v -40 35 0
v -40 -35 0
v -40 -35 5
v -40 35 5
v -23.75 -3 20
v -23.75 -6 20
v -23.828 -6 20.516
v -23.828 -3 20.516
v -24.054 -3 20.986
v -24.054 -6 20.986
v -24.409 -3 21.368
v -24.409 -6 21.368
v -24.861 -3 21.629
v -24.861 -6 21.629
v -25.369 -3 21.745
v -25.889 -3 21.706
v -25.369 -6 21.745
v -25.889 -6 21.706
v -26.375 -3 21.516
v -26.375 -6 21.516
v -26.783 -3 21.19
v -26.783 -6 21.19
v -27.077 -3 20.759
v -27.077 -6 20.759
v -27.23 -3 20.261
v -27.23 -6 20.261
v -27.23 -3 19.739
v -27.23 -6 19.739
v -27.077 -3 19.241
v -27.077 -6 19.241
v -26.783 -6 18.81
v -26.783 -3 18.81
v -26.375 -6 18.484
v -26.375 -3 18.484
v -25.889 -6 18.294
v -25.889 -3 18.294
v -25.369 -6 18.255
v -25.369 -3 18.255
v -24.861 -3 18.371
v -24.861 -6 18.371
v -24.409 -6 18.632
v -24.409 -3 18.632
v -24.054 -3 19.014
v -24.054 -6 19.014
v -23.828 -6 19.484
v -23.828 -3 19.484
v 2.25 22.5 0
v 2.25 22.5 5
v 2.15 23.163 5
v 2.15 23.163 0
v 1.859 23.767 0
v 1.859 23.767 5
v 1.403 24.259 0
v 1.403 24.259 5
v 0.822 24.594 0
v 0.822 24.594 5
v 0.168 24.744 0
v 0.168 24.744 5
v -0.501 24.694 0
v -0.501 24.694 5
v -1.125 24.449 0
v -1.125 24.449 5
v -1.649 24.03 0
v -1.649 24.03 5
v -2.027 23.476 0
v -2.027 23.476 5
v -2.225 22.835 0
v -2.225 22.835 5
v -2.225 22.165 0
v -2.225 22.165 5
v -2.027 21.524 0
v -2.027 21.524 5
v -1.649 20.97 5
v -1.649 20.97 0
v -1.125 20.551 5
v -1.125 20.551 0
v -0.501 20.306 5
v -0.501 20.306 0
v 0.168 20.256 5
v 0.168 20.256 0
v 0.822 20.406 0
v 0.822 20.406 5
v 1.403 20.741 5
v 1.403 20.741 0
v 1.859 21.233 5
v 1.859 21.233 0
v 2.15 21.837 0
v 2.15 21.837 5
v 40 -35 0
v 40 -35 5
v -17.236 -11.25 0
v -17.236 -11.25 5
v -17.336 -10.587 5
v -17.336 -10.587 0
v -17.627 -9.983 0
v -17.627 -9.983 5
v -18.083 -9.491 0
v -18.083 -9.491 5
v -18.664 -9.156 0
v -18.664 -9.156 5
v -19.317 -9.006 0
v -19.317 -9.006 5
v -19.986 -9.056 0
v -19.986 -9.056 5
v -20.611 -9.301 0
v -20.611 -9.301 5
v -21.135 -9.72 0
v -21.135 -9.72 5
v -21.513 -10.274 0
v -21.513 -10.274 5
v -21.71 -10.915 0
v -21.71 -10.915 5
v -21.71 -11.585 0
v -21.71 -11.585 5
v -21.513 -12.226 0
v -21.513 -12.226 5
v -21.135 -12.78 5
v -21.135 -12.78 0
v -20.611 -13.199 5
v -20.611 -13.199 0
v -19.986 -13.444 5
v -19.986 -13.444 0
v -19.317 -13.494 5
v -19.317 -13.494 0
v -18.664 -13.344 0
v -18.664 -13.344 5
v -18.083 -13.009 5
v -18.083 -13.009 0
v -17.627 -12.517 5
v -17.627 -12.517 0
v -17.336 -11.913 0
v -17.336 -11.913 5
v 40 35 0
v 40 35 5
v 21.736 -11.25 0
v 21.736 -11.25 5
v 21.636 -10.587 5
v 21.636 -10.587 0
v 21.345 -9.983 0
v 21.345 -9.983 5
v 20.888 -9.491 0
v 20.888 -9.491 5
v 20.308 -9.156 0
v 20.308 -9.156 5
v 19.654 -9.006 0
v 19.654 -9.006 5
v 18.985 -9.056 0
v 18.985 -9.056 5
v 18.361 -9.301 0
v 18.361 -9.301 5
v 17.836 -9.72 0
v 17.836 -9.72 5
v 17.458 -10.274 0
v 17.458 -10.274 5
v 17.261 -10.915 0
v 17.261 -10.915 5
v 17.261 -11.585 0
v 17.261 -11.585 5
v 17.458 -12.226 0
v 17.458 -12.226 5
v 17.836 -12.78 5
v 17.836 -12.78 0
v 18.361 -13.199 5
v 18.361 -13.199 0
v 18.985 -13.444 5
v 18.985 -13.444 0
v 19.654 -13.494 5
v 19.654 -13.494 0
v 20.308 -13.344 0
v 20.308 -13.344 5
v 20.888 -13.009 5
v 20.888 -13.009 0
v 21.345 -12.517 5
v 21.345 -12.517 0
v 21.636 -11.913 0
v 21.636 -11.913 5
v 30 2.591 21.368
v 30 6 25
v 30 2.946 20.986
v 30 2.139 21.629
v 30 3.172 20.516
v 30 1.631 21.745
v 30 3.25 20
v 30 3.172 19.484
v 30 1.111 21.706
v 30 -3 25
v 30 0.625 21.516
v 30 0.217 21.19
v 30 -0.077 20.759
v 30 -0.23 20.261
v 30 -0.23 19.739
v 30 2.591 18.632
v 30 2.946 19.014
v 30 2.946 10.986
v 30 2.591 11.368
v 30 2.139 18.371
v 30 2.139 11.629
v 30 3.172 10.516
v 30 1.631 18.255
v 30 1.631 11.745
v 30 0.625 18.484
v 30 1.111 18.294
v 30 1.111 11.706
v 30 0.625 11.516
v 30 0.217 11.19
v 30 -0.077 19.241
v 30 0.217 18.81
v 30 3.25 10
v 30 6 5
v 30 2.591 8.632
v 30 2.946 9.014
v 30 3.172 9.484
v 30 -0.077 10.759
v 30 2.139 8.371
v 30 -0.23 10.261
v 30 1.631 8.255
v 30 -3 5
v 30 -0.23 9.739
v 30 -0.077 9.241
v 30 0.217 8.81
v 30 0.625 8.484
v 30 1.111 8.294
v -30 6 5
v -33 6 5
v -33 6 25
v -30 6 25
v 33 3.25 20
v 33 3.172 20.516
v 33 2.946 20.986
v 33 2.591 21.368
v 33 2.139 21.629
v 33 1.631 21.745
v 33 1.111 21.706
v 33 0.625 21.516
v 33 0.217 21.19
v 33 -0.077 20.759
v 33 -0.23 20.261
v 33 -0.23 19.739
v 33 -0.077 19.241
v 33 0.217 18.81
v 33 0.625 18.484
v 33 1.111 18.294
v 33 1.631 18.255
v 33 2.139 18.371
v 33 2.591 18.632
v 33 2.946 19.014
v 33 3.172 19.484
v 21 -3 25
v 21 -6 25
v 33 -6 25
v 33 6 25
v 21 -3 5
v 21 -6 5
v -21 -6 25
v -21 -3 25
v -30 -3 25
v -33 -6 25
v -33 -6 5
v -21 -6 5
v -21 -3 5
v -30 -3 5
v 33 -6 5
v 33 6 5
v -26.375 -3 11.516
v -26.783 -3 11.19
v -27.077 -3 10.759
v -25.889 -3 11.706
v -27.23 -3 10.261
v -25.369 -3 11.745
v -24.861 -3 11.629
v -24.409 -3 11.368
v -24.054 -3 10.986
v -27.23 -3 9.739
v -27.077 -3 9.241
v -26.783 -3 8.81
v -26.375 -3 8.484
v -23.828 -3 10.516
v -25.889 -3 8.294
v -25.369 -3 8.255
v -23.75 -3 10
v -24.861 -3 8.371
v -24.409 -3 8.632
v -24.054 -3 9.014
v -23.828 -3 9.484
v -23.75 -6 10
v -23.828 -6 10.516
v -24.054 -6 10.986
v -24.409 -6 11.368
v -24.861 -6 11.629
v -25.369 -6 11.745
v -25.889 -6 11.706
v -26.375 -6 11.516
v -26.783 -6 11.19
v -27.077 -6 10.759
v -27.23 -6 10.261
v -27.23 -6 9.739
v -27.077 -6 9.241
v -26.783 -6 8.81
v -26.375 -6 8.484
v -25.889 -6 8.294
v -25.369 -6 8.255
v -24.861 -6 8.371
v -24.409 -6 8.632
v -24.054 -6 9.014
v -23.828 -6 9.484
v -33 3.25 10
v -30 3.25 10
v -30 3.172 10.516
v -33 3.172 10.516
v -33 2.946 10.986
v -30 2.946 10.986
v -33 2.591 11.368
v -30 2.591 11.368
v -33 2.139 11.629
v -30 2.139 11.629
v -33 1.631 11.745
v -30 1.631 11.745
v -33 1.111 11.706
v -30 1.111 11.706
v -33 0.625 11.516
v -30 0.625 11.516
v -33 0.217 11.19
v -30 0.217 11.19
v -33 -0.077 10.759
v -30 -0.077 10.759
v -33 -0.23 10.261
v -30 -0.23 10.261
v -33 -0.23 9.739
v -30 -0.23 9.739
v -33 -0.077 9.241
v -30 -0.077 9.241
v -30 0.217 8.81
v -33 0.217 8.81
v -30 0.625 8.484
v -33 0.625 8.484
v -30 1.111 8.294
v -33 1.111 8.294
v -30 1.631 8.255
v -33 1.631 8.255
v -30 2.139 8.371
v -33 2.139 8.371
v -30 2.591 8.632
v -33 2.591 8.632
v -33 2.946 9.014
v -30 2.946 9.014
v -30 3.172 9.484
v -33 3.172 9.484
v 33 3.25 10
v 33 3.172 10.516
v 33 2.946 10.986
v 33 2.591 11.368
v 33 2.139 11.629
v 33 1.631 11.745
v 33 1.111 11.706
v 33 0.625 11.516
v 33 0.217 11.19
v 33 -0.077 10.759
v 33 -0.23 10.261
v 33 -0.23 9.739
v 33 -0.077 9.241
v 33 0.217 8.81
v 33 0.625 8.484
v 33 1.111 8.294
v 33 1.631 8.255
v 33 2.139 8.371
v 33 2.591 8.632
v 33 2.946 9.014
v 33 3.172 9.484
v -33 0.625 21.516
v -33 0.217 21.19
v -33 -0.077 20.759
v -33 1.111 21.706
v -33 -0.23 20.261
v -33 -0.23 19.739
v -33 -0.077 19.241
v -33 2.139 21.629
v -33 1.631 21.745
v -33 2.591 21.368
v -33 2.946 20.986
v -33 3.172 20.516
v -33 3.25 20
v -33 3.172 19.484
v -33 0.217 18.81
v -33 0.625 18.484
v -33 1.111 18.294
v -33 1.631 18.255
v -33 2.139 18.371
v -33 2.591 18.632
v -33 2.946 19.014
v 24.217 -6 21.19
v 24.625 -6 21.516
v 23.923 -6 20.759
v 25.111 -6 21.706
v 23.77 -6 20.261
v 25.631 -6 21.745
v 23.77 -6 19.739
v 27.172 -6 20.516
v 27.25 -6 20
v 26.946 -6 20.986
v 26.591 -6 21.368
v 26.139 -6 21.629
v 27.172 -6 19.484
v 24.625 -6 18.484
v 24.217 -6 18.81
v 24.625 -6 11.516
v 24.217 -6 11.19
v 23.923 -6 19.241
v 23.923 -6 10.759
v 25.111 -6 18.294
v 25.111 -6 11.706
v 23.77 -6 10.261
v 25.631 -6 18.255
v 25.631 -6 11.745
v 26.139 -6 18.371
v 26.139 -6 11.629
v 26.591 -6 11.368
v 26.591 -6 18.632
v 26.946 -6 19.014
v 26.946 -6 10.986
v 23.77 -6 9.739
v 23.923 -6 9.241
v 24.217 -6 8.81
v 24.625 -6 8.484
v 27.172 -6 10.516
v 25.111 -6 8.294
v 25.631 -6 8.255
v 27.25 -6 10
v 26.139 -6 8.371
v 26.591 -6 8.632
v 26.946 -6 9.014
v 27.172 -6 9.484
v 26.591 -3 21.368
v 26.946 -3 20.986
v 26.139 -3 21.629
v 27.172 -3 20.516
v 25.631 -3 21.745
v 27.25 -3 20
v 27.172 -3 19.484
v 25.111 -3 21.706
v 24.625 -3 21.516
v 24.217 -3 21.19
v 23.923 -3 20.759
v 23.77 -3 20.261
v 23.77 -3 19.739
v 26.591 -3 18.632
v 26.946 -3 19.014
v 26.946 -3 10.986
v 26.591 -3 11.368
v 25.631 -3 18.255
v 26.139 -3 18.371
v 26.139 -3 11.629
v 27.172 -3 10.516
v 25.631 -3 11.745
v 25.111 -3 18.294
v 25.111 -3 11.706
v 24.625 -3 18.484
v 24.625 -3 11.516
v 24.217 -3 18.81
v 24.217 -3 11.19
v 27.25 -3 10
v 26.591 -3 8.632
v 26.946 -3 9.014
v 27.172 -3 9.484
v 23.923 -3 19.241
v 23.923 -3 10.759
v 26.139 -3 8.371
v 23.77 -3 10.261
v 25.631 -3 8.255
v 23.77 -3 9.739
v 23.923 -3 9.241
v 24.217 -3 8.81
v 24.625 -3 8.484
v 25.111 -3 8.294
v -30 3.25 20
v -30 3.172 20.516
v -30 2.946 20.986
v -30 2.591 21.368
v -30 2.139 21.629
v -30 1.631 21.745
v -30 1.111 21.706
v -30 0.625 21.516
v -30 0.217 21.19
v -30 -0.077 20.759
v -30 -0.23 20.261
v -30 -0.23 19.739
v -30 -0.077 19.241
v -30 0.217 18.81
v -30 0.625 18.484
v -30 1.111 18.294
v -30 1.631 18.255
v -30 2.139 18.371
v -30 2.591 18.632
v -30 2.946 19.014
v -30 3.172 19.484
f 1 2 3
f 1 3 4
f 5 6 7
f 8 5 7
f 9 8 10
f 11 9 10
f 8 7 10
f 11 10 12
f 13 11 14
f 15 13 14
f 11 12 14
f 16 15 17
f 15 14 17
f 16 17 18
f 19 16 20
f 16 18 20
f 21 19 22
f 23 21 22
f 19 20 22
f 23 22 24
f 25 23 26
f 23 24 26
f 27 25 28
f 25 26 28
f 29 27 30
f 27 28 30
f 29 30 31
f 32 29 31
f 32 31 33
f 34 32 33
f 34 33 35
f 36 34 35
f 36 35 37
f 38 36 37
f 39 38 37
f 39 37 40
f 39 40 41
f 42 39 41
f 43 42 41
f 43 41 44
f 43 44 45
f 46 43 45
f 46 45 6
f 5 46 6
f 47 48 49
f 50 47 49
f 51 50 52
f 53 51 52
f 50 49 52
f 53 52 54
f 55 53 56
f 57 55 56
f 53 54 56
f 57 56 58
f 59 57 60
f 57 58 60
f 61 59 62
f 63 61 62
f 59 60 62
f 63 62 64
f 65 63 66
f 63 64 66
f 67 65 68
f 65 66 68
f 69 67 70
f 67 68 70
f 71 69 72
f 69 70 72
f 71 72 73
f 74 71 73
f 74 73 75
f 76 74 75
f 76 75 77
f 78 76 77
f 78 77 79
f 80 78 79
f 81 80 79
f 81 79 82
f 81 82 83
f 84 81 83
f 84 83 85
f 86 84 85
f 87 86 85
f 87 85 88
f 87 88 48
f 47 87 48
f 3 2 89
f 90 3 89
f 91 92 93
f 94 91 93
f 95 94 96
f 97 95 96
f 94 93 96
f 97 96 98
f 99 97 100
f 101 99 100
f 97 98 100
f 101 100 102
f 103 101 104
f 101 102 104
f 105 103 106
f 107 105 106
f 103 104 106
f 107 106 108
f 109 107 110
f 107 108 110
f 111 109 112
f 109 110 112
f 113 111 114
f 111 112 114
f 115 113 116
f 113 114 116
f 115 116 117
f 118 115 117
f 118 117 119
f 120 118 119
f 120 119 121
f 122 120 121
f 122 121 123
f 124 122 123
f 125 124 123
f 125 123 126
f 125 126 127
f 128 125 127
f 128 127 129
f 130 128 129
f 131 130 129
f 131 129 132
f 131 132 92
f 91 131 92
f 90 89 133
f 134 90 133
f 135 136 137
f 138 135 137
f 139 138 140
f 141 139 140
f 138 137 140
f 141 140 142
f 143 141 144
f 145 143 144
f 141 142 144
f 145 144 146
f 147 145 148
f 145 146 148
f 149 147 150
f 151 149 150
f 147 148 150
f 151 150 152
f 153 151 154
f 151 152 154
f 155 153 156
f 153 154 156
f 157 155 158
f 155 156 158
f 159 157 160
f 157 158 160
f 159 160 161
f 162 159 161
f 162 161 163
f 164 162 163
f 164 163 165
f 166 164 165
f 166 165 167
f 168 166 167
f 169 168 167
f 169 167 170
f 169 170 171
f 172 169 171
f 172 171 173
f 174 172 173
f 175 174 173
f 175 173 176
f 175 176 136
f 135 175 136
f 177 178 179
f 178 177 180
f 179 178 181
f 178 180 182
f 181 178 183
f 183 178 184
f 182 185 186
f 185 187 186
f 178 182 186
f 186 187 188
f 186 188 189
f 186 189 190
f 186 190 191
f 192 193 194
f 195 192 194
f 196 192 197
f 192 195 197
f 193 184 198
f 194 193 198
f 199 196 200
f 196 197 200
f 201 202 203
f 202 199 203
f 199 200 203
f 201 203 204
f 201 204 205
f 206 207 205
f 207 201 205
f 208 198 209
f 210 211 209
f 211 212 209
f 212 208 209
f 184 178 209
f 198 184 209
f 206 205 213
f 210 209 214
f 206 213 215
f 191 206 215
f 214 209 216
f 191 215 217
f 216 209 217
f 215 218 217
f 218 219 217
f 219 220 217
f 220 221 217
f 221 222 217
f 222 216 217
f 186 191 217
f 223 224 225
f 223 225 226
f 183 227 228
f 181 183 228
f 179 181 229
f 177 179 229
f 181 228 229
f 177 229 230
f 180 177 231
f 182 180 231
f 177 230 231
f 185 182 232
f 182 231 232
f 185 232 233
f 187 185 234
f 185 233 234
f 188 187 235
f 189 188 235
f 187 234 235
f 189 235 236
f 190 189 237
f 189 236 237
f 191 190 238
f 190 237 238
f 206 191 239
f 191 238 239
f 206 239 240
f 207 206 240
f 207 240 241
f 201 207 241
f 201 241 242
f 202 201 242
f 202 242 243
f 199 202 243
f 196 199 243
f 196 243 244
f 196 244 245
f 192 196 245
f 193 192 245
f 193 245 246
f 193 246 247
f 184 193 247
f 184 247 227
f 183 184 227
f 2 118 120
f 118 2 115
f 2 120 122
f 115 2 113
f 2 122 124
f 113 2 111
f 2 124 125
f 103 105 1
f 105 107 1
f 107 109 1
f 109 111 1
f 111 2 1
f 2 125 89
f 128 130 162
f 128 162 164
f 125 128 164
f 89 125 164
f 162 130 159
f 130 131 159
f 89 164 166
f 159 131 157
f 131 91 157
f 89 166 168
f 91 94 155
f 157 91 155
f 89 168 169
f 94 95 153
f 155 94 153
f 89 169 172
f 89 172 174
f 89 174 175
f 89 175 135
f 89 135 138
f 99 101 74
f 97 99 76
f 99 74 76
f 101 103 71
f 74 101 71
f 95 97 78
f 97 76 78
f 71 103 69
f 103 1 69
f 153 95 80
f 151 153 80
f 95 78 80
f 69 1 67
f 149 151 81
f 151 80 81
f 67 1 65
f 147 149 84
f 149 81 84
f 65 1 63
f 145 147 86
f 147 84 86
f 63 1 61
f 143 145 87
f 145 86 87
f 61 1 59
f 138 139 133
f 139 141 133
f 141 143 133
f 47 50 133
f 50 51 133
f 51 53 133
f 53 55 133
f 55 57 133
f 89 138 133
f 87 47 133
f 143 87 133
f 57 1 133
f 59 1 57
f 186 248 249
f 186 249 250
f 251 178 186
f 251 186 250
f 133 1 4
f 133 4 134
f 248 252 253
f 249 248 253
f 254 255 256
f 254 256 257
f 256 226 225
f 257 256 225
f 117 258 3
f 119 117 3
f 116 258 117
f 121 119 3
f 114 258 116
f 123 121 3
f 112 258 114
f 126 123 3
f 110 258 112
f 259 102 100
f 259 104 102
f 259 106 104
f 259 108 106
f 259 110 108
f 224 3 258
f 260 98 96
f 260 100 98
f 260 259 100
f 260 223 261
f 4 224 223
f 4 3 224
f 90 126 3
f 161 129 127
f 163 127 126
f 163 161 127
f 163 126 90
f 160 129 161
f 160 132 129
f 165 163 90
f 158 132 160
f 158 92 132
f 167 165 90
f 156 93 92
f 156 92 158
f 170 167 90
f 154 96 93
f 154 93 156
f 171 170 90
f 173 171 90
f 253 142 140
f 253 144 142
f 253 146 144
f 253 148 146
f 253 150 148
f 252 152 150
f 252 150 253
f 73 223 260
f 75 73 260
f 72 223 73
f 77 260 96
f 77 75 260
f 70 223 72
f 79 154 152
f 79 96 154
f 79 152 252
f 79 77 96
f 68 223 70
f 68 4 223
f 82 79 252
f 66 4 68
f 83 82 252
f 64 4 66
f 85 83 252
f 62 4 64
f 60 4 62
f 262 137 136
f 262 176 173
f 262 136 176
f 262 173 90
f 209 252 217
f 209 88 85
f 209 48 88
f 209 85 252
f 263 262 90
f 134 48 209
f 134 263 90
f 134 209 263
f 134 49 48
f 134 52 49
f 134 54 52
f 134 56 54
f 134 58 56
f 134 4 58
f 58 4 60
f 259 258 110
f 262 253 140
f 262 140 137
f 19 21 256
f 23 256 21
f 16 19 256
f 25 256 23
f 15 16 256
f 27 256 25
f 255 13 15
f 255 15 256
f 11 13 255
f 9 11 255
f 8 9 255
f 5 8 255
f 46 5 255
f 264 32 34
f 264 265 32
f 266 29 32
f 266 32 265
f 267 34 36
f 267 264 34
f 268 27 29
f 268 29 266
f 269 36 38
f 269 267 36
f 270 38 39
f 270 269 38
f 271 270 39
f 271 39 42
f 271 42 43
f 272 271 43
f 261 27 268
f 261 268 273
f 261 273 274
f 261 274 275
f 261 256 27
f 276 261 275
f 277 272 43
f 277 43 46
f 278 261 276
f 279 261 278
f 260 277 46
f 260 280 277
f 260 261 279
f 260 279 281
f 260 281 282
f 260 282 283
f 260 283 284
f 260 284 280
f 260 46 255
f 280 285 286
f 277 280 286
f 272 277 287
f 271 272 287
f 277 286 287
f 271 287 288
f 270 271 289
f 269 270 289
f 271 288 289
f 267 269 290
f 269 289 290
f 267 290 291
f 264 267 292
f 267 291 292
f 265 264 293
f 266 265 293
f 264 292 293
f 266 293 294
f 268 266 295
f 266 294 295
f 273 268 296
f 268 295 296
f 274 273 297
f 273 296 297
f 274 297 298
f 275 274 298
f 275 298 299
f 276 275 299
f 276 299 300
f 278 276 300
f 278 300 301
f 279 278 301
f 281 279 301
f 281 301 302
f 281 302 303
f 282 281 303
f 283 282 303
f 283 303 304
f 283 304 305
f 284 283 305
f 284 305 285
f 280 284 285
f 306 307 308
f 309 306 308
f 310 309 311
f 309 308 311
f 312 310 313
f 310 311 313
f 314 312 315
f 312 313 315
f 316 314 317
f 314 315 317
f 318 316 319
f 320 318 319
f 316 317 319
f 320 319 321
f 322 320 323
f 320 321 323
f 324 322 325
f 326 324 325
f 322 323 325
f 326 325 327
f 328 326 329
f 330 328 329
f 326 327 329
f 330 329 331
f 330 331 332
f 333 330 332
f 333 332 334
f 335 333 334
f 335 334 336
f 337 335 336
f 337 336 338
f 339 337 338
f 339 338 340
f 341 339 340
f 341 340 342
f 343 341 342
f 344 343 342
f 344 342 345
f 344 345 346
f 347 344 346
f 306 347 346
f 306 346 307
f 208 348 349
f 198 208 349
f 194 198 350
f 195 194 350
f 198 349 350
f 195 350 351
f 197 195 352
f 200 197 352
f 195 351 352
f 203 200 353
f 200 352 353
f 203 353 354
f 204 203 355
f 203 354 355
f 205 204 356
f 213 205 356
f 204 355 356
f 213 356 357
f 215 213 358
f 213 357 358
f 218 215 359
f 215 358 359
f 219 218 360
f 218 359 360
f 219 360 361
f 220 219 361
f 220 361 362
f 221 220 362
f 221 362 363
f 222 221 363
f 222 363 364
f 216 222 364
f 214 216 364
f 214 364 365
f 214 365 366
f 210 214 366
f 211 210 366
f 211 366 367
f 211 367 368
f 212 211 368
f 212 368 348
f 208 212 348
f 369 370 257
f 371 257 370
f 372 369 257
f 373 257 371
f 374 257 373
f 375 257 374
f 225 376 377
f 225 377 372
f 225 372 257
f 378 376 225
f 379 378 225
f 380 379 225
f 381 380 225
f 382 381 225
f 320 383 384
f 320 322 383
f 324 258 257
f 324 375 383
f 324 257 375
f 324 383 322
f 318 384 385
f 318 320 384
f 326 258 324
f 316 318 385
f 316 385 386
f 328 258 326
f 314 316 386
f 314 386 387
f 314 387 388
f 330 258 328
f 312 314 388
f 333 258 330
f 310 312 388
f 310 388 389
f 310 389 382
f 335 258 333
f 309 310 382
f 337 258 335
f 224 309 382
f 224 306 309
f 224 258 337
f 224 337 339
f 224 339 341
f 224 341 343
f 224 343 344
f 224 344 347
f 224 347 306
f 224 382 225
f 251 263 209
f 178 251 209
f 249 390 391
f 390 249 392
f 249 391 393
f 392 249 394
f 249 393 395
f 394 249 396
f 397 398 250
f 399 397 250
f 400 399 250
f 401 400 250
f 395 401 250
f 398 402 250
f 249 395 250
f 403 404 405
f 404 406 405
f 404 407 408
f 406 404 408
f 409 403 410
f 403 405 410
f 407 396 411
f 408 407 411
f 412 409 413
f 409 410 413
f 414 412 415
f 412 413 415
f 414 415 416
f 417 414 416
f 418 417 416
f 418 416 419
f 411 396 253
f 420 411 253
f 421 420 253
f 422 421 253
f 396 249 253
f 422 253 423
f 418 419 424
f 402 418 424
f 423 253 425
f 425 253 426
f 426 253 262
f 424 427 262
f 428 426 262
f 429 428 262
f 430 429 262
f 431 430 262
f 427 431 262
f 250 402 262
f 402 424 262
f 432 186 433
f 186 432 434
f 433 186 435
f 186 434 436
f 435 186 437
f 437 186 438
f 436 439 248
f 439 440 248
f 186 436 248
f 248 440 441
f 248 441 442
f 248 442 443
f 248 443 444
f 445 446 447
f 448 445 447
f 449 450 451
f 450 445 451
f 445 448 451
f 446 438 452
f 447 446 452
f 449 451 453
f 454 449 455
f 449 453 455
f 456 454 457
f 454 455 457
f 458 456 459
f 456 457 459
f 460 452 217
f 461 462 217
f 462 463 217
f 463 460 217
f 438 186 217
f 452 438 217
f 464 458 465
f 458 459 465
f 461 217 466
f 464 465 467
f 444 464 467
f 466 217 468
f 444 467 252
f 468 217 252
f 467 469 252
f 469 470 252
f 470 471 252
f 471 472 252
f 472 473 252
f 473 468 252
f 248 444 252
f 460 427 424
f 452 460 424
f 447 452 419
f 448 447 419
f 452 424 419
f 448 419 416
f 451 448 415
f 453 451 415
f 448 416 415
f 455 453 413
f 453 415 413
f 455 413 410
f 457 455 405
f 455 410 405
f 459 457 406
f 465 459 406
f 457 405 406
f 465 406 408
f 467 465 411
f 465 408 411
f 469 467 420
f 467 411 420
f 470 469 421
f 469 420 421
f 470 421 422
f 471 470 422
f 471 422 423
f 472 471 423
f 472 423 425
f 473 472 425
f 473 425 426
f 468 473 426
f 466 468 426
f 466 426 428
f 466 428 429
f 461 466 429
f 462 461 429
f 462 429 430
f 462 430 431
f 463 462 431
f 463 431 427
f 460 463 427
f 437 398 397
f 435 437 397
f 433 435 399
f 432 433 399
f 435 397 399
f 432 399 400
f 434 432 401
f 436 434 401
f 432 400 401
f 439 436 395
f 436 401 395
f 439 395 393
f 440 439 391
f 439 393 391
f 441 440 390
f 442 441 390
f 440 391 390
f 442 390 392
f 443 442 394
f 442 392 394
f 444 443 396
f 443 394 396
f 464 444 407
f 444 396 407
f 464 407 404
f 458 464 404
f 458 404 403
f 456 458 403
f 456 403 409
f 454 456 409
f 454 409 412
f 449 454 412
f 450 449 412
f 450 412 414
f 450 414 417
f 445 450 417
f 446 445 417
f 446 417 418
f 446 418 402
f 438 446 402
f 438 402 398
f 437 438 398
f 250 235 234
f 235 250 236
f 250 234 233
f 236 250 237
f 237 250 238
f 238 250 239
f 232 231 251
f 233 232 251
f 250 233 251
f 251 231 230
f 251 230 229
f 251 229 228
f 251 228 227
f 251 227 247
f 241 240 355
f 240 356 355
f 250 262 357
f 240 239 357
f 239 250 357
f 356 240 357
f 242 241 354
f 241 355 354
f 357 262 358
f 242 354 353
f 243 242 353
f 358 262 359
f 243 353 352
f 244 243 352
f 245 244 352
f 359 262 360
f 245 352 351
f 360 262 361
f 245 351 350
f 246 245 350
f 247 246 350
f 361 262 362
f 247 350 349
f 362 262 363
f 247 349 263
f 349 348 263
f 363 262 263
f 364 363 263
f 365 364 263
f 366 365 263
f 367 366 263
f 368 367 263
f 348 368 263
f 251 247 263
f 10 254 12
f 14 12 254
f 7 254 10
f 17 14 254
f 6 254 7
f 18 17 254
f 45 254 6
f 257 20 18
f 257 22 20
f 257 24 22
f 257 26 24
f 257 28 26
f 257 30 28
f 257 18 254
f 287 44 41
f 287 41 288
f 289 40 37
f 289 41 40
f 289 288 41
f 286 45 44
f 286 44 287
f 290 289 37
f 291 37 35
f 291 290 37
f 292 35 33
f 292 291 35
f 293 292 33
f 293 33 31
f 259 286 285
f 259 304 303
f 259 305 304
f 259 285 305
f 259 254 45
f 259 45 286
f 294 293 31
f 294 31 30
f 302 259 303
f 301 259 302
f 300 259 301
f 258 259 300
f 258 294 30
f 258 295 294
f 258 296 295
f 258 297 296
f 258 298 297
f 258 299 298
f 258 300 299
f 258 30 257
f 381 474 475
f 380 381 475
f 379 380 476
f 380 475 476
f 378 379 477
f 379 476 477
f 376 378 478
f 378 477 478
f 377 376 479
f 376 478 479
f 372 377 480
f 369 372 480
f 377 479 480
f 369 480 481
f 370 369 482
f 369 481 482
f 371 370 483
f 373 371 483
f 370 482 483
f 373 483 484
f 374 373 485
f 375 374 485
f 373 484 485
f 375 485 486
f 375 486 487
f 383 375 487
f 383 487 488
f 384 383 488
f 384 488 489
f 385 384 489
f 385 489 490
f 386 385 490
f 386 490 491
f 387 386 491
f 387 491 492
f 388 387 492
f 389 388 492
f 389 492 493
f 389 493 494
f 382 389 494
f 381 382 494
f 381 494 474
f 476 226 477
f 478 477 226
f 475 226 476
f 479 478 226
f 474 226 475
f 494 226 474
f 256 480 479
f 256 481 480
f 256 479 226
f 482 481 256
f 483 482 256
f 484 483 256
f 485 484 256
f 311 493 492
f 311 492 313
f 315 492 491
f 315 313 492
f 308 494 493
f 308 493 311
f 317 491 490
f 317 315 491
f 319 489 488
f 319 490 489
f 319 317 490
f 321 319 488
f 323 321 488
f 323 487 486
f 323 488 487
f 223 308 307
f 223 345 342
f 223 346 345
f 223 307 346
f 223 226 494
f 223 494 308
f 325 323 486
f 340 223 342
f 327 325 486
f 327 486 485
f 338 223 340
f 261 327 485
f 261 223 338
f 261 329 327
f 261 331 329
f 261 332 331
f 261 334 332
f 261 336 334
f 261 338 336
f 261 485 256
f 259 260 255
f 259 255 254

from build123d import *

# Parameters (mm, degrees)
SKETCH_1_W          = 80
SKETCH_1_H          = 70
EXTRUDE_1_DEPTH     = 5
EXTRUDE_2_DEPTH     = 20
SKETCH_3_R          = 1.75
CUT_EXTRUDE_1_DEPTH = 85.728979694
SKETCH_4_R          = 1.75
CUT_EXTRUDE_2_DEPTH = 63.497999968
SKETCH_5_R          = 2.25
CUT_EXTRUDE_3_DEPTH = 57.789083458


with BuildPart() as part:
    # ｽｹｯﾁ1 → ﾎﾞｽ - 押し出し1 (new body)
    with BuildSketch(Plane.XY):
        Rectangle(SKETCH_1_W, SKETCH_1_H)
    extrude(amount=EXTRUDE_1_DEPTH)

    # ｽｹｯﾁ2 → ﾎﾞｽ - 押し出し2 (add)
    with BuildSketch(Plane.XY.offset(5)):
        Polygon((-30, -3), (-21, -3), (-21, -6), (-33, -6), (-33, 6), (-30, 6), align=None)
        Polygon((21, -3), (21, -6), (33, -6), (33, 6), (30, 6), (30, -3), align=None)
    extrude(amount=EXTRUDE_2_DEPTH)

    # ｽｹｯﾁ3 → ｶｯﾄ - 押し出し1 (cut, through all)
    with BuildSketch(Plane(origin=(33, 0, 0), x_dir=(0, 0, -1), z_dir=(1, 0, 0))):
        with Locations(Location((-10, 1.5, 0), (0, 0, 90))):
            Circle(SKETCH_3_R)
        with Locations(Location((-20, 1.5, 0), (0, 0, 90))):
            Circle(SKETCH_3_R)
    extrude(amount=-CUT_EXTRUDE_1_DEPTH, mode=Mode.SUBTRACT)

    # ｽｹｯﾁ4 → ｶｯﾄ - 押し出し2 (cut, through all)
    with BuildSketch(Plane.XZ.offset(6)):
        with Locations((25.5, 10)):
            Circle(SKETCH_4_R)
        with Locations((25.5, 20)):
            Circle(SKETCH_4_R)
        with Locations((-25.5, 10)):
            Circle(SKETCH_4_R)
        with Locations((-25.5, 20)):
            Circle(SKETCH_4_R)
    extrude(amount=-CUT_EXTRUDE_2_DEPTH, mode=Mode.SUBTRACT)

    # ｽｹｯﾁ5 → ｶｯﾄ - 押し出し3 (cut, through all)
    with BuildSketch(Plane.XY.offset(5)):
        with Locations((0, 22.5)):
            Circle(SKETCH_5_R)
        with Locations((19.485571585, -11.25)):
            Circle(SKETCH_5_R)
        with Locations((-19.485571585, -11.25)):
            Circle(SKETCH_5_R)
    extrude(amount=-CUT_EXTRUDE_3_DEPTH, mode=Mode.SUBTRACT)


solid = part.part
